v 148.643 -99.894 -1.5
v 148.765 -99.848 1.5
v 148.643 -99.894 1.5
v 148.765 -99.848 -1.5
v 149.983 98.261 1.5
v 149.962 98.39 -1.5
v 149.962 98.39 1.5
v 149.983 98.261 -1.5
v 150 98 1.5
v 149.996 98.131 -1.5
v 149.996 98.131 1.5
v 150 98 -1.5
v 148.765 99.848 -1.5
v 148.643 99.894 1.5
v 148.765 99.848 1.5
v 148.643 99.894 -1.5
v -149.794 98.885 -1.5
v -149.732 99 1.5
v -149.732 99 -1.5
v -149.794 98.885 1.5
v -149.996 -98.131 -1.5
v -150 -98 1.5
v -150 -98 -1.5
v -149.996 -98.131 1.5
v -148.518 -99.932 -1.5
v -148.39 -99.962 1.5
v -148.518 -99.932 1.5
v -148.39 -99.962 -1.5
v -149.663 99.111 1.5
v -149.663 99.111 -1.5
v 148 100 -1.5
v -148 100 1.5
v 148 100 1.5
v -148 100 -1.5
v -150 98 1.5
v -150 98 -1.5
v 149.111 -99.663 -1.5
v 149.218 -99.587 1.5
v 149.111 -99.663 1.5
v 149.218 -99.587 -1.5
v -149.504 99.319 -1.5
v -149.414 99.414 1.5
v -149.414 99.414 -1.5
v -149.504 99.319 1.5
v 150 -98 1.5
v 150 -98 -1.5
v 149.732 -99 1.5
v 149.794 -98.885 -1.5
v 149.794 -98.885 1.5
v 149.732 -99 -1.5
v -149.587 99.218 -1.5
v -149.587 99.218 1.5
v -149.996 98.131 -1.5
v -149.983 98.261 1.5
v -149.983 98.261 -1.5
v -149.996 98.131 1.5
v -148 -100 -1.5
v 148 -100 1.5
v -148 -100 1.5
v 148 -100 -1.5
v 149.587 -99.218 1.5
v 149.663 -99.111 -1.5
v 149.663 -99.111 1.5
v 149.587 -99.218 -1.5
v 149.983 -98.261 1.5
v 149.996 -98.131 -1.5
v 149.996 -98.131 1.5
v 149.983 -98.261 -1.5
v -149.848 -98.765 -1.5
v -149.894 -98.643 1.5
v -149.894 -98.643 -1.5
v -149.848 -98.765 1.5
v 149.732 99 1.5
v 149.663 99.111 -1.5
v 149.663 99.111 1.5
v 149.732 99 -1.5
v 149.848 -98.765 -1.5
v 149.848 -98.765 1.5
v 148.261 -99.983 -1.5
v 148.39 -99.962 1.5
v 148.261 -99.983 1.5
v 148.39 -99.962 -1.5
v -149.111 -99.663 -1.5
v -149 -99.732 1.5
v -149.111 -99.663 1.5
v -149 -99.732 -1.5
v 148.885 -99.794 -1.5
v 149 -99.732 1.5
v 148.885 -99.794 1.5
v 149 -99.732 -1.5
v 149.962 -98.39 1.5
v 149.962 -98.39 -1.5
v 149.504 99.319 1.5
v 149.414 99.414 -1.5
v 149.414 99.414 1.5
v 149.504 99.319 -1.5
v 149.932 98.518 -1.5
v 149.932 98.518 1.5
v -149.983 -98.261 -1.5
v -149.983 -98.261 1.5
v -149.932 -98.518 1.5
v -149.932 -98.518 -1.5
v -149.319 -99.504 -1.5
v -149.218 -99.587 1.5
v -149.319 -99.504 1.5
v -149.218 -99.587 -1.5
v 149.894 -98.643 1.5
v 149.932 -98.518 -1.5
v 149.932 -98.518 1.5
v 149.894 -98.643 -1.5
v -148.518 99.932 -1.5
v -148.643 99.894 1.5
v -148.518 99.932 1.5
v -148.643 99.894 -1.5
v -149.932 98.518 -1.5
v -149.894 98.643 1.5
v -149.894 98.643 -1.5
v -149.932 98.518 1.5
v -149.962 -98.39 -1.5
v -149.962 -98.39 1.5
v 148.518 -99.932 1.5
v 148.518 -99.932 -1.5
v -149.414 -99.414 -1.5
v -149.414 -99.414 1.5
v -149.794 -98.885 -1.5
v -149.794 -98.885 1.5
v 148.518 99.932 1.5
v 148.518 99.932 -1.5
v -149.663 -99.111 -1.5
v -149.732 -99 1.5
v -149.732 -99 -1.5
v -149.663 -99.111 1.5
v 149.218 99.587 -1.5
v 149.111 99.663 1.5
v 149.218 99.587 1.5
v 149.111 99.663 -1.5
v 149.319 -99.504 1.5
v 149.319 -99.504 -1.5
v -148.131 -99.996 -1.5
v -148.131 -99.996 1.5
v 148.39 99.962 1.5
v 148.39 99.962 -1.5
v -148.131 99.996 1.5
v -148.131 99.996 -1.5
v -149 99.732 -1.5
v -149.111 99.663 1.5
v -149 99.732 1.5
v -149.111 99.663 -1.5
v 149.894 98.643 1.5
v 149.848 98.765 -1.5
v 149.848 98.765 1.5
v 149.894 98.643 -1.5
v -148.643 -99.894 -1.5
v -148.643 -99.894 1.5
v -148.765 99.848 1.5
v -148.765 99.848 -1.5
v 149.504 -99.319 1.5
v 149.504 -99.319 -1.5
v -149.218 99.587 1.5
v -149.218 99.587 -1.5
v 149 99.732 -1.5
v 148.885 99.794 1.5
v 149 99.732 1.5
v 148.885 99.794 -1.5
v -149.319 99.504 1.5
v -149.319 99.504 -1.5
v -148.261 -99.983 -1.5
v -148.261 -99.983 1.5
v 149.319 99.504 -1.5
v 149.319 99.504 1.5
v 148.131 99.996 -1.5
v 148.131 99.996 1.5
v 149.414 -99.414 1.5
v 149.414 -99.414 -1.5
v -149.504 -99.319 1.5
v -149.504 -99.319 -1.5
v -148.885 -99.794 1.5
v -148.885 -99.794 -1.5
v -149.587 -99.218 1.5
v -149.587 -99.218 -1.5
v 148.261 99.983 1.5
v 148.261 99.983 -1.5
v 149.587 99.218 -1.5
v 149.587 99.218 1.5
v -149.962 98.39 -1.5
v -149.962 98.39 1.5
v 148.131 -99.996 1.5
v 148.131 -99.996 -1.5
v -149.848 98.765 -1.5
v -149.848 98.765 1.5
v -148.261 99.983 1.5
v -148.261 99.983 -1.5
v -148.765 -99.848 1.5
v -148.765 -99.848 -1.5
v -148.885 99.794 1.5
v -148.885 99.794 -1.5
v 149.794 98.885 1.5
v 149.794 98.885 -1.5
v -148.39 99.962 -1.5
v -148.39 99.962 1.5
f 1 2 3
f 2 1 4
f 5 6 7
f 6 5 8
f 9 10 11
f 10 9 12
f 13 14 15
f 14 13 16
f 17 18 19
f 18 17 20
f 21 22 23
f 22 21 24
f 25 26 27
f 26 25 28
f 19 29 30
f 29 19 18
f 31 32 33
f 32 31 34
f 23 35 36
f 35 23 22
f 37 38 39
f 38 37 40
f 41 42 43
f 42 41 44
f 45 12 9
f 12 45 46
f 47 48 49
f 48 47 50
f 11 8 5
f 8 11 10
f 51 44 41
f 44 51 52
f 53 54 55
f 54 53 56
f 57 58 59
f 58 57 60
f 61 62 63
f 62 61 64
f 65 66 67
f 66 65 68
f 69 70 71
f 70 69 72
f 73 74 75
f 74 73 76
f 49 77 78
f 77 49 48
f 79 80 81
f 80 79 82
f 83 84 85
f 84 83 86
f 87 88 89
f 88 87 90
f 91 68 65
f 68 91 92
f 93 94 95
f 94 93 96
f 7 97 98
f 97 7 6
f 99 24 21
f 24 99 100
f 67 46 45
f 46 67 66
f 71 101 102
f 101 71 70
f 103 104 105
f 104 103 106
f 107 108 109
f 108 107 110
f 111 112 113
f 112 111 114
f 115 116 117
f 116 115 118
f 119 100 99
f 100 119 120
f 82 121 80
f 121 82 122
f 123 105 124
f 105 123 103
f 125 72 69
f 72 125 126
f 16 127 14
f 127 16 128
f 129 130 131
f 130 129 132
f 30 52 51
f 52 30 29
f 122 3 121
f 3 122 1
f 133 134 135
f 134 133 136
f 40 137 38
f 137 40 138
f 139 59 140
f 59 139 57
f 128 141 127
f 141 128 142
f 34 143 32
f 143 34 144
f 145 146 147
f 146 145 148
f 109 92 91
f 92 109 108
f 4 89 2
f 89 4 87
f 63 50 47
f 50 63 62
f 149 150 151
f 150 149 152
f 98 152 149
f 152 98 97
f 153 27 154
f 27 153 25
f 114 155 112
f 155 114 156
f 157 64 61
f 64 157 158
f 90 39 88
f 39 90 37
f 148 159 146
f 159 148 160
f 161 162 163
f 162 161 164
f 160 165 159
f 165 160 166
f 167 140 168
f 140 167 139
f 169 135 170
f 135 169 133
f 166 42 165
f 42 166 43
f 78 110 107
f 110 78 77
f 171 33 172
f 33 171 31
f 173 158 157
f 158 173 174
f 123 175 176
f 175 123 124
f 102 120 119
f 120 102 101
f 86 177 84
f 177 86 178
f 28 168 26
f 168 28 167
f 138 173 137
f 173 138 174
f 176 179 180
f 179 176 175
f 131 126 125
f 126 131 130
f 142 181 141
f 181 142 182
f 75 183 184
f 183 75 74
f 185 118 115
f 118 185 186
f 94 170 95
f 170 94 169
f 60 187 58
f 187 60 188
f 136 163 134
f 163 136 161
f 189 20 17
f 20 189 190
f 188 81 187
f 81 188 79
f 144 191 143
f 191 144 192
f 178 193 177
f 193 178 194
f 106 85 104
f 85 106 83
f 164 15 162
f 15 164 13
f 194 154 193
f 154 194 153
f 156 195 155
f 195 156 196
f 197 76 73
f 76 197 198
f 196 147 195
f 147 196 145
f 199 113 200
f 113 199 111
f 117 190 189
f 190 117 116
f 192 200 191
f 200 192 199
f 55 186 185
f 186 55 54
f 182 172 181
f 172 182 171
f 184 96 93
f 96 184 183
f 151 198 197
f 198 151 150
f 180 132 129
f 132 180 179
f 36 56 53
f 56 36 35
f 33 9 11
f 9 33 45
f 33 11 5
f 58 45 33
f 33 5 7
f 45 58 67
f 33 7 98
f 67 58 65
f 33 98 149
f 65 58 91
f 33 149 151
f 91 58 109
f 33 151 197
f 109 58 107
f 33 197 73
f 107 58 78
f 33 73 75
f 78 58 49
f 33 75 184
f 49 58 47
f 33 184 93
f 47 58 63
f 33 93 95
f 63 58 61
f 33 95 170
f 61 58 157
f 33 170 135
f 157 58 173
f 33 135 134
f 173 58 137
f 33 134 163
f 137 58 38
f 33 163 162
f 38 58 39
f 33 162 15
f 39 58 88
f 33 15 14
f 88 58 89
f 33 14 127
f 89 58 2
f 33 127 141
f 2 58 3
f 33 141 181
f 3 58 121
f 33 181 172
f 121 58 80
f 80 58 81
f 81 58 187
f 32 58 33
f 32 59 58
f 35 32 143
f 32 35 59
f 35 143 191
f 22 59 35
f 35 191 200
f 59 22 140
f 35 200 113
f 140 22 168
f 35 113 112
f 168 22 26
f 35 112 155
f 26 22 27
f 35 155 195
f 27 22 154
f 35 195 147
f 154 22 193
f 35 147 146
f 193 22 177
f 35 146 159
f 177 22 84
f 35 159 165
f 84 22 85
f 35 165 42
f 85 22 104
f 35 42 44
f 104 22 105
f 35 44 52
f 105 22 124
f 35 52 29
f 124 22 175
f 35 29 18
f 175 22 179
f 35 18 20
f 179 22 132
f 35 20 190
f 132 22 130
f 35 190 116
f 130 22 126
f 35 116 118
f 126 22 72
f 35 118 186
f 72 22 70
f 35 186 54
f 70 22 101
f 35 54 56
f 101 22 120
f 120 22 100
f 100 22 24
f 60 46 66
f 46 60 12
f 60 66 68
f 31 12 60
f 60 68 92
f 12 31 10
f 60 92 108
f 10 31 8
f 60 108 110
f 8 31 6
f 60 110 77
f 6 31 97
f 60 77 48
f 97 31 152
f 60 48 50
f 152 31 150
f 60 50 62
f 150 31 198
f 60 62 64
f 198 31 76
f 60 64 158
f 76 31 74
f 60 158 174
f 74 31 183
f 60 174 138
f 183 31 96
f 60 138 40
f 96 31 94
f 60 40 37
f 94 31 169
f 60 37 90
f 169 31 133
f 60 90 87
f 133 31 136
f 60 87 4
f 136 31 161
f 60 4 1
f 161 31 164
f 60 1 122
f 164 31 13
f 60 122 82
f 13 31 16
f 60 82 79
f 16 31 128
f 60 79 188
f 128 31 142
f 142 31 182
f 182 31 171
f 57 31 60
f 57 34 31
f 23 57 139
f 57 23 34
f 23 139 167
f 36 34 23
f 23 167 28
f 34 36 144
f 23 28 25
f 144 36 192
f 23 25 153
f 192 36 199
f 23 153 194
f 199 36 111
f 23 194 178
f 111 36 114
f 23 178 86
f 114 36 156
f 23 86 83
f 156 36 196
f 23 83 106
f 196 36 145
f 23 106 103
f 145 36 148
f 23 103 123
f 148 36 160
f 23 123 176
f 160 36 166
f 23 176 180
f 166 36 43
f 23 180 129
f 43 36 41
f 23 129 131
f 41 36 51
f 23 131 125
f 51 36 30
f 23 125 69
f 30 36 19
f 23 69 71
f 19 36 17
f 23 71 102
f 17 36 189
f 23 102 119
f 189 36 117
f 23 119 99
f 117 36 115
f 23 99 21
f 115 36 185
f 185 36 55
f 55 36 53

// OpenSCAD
$fn = 96;

// DiBond sheet dimensions (mm)
sheet_length    = 300;
sheet_width     = 200;
sheet_thickness = 3;

// DiBond construction: aluminum skins + polyethylene core
skin_thickness = 0.3;  // typical thin Al skin
corner_radius  = 2;

// Robust overlap to guarantee a single connected manifold after CGAL
eps = 0.05;

module rounded_plate(l, w, t, r){
    r2 = min(r, min(l, w)/2);
    // Use minkowski for reliable rounded corners (avoids offset edge cases)
    linear_extrude(height=t, center=true, convexity=10)
        minkowski() {
            square([l - 2*r2, w - 2*r2], center=true);
            circle(r=r2);
        }
}

module dibond_sheet(l, w, t, r, skin_t){
    skin_t2 = min(skin_t, t/2 - eps);          // keep valid even if user sets too thick
    core_t  = max(t - 2*skin_t2, eps);         // ensure non-zero core

    union() {
        // Core (slightly thickened to overlap skins)
        color([0.10, 0.10, 0.10])
            rounded_plate(l, w, core_t + 2*eps, r);

        // Top aluminum skin (position computed from thicknesses; overlaps core by eps)
        color([0.80, 0.80, 0.83])
            translate([0, 0, core_t/2 + skin_t2/2 - eps])
                rounded_plate(l, w, skin_t2 + 2*eps, r);

        // Bottom aluminum skin (position computed from thicknesses; overlaps core by eps)
        color([0.80, 0.80, 0.83])
            translate([0, 0, -(core_t/2 + skin_t2/2 - eps)])
                rounded_plate(l, w, skin_t2 + 2*eps, r);
    }
}

dibond_sheet(sheet_length, sheet_width, sheet_thickness, corner_radius, skin_thickness);
